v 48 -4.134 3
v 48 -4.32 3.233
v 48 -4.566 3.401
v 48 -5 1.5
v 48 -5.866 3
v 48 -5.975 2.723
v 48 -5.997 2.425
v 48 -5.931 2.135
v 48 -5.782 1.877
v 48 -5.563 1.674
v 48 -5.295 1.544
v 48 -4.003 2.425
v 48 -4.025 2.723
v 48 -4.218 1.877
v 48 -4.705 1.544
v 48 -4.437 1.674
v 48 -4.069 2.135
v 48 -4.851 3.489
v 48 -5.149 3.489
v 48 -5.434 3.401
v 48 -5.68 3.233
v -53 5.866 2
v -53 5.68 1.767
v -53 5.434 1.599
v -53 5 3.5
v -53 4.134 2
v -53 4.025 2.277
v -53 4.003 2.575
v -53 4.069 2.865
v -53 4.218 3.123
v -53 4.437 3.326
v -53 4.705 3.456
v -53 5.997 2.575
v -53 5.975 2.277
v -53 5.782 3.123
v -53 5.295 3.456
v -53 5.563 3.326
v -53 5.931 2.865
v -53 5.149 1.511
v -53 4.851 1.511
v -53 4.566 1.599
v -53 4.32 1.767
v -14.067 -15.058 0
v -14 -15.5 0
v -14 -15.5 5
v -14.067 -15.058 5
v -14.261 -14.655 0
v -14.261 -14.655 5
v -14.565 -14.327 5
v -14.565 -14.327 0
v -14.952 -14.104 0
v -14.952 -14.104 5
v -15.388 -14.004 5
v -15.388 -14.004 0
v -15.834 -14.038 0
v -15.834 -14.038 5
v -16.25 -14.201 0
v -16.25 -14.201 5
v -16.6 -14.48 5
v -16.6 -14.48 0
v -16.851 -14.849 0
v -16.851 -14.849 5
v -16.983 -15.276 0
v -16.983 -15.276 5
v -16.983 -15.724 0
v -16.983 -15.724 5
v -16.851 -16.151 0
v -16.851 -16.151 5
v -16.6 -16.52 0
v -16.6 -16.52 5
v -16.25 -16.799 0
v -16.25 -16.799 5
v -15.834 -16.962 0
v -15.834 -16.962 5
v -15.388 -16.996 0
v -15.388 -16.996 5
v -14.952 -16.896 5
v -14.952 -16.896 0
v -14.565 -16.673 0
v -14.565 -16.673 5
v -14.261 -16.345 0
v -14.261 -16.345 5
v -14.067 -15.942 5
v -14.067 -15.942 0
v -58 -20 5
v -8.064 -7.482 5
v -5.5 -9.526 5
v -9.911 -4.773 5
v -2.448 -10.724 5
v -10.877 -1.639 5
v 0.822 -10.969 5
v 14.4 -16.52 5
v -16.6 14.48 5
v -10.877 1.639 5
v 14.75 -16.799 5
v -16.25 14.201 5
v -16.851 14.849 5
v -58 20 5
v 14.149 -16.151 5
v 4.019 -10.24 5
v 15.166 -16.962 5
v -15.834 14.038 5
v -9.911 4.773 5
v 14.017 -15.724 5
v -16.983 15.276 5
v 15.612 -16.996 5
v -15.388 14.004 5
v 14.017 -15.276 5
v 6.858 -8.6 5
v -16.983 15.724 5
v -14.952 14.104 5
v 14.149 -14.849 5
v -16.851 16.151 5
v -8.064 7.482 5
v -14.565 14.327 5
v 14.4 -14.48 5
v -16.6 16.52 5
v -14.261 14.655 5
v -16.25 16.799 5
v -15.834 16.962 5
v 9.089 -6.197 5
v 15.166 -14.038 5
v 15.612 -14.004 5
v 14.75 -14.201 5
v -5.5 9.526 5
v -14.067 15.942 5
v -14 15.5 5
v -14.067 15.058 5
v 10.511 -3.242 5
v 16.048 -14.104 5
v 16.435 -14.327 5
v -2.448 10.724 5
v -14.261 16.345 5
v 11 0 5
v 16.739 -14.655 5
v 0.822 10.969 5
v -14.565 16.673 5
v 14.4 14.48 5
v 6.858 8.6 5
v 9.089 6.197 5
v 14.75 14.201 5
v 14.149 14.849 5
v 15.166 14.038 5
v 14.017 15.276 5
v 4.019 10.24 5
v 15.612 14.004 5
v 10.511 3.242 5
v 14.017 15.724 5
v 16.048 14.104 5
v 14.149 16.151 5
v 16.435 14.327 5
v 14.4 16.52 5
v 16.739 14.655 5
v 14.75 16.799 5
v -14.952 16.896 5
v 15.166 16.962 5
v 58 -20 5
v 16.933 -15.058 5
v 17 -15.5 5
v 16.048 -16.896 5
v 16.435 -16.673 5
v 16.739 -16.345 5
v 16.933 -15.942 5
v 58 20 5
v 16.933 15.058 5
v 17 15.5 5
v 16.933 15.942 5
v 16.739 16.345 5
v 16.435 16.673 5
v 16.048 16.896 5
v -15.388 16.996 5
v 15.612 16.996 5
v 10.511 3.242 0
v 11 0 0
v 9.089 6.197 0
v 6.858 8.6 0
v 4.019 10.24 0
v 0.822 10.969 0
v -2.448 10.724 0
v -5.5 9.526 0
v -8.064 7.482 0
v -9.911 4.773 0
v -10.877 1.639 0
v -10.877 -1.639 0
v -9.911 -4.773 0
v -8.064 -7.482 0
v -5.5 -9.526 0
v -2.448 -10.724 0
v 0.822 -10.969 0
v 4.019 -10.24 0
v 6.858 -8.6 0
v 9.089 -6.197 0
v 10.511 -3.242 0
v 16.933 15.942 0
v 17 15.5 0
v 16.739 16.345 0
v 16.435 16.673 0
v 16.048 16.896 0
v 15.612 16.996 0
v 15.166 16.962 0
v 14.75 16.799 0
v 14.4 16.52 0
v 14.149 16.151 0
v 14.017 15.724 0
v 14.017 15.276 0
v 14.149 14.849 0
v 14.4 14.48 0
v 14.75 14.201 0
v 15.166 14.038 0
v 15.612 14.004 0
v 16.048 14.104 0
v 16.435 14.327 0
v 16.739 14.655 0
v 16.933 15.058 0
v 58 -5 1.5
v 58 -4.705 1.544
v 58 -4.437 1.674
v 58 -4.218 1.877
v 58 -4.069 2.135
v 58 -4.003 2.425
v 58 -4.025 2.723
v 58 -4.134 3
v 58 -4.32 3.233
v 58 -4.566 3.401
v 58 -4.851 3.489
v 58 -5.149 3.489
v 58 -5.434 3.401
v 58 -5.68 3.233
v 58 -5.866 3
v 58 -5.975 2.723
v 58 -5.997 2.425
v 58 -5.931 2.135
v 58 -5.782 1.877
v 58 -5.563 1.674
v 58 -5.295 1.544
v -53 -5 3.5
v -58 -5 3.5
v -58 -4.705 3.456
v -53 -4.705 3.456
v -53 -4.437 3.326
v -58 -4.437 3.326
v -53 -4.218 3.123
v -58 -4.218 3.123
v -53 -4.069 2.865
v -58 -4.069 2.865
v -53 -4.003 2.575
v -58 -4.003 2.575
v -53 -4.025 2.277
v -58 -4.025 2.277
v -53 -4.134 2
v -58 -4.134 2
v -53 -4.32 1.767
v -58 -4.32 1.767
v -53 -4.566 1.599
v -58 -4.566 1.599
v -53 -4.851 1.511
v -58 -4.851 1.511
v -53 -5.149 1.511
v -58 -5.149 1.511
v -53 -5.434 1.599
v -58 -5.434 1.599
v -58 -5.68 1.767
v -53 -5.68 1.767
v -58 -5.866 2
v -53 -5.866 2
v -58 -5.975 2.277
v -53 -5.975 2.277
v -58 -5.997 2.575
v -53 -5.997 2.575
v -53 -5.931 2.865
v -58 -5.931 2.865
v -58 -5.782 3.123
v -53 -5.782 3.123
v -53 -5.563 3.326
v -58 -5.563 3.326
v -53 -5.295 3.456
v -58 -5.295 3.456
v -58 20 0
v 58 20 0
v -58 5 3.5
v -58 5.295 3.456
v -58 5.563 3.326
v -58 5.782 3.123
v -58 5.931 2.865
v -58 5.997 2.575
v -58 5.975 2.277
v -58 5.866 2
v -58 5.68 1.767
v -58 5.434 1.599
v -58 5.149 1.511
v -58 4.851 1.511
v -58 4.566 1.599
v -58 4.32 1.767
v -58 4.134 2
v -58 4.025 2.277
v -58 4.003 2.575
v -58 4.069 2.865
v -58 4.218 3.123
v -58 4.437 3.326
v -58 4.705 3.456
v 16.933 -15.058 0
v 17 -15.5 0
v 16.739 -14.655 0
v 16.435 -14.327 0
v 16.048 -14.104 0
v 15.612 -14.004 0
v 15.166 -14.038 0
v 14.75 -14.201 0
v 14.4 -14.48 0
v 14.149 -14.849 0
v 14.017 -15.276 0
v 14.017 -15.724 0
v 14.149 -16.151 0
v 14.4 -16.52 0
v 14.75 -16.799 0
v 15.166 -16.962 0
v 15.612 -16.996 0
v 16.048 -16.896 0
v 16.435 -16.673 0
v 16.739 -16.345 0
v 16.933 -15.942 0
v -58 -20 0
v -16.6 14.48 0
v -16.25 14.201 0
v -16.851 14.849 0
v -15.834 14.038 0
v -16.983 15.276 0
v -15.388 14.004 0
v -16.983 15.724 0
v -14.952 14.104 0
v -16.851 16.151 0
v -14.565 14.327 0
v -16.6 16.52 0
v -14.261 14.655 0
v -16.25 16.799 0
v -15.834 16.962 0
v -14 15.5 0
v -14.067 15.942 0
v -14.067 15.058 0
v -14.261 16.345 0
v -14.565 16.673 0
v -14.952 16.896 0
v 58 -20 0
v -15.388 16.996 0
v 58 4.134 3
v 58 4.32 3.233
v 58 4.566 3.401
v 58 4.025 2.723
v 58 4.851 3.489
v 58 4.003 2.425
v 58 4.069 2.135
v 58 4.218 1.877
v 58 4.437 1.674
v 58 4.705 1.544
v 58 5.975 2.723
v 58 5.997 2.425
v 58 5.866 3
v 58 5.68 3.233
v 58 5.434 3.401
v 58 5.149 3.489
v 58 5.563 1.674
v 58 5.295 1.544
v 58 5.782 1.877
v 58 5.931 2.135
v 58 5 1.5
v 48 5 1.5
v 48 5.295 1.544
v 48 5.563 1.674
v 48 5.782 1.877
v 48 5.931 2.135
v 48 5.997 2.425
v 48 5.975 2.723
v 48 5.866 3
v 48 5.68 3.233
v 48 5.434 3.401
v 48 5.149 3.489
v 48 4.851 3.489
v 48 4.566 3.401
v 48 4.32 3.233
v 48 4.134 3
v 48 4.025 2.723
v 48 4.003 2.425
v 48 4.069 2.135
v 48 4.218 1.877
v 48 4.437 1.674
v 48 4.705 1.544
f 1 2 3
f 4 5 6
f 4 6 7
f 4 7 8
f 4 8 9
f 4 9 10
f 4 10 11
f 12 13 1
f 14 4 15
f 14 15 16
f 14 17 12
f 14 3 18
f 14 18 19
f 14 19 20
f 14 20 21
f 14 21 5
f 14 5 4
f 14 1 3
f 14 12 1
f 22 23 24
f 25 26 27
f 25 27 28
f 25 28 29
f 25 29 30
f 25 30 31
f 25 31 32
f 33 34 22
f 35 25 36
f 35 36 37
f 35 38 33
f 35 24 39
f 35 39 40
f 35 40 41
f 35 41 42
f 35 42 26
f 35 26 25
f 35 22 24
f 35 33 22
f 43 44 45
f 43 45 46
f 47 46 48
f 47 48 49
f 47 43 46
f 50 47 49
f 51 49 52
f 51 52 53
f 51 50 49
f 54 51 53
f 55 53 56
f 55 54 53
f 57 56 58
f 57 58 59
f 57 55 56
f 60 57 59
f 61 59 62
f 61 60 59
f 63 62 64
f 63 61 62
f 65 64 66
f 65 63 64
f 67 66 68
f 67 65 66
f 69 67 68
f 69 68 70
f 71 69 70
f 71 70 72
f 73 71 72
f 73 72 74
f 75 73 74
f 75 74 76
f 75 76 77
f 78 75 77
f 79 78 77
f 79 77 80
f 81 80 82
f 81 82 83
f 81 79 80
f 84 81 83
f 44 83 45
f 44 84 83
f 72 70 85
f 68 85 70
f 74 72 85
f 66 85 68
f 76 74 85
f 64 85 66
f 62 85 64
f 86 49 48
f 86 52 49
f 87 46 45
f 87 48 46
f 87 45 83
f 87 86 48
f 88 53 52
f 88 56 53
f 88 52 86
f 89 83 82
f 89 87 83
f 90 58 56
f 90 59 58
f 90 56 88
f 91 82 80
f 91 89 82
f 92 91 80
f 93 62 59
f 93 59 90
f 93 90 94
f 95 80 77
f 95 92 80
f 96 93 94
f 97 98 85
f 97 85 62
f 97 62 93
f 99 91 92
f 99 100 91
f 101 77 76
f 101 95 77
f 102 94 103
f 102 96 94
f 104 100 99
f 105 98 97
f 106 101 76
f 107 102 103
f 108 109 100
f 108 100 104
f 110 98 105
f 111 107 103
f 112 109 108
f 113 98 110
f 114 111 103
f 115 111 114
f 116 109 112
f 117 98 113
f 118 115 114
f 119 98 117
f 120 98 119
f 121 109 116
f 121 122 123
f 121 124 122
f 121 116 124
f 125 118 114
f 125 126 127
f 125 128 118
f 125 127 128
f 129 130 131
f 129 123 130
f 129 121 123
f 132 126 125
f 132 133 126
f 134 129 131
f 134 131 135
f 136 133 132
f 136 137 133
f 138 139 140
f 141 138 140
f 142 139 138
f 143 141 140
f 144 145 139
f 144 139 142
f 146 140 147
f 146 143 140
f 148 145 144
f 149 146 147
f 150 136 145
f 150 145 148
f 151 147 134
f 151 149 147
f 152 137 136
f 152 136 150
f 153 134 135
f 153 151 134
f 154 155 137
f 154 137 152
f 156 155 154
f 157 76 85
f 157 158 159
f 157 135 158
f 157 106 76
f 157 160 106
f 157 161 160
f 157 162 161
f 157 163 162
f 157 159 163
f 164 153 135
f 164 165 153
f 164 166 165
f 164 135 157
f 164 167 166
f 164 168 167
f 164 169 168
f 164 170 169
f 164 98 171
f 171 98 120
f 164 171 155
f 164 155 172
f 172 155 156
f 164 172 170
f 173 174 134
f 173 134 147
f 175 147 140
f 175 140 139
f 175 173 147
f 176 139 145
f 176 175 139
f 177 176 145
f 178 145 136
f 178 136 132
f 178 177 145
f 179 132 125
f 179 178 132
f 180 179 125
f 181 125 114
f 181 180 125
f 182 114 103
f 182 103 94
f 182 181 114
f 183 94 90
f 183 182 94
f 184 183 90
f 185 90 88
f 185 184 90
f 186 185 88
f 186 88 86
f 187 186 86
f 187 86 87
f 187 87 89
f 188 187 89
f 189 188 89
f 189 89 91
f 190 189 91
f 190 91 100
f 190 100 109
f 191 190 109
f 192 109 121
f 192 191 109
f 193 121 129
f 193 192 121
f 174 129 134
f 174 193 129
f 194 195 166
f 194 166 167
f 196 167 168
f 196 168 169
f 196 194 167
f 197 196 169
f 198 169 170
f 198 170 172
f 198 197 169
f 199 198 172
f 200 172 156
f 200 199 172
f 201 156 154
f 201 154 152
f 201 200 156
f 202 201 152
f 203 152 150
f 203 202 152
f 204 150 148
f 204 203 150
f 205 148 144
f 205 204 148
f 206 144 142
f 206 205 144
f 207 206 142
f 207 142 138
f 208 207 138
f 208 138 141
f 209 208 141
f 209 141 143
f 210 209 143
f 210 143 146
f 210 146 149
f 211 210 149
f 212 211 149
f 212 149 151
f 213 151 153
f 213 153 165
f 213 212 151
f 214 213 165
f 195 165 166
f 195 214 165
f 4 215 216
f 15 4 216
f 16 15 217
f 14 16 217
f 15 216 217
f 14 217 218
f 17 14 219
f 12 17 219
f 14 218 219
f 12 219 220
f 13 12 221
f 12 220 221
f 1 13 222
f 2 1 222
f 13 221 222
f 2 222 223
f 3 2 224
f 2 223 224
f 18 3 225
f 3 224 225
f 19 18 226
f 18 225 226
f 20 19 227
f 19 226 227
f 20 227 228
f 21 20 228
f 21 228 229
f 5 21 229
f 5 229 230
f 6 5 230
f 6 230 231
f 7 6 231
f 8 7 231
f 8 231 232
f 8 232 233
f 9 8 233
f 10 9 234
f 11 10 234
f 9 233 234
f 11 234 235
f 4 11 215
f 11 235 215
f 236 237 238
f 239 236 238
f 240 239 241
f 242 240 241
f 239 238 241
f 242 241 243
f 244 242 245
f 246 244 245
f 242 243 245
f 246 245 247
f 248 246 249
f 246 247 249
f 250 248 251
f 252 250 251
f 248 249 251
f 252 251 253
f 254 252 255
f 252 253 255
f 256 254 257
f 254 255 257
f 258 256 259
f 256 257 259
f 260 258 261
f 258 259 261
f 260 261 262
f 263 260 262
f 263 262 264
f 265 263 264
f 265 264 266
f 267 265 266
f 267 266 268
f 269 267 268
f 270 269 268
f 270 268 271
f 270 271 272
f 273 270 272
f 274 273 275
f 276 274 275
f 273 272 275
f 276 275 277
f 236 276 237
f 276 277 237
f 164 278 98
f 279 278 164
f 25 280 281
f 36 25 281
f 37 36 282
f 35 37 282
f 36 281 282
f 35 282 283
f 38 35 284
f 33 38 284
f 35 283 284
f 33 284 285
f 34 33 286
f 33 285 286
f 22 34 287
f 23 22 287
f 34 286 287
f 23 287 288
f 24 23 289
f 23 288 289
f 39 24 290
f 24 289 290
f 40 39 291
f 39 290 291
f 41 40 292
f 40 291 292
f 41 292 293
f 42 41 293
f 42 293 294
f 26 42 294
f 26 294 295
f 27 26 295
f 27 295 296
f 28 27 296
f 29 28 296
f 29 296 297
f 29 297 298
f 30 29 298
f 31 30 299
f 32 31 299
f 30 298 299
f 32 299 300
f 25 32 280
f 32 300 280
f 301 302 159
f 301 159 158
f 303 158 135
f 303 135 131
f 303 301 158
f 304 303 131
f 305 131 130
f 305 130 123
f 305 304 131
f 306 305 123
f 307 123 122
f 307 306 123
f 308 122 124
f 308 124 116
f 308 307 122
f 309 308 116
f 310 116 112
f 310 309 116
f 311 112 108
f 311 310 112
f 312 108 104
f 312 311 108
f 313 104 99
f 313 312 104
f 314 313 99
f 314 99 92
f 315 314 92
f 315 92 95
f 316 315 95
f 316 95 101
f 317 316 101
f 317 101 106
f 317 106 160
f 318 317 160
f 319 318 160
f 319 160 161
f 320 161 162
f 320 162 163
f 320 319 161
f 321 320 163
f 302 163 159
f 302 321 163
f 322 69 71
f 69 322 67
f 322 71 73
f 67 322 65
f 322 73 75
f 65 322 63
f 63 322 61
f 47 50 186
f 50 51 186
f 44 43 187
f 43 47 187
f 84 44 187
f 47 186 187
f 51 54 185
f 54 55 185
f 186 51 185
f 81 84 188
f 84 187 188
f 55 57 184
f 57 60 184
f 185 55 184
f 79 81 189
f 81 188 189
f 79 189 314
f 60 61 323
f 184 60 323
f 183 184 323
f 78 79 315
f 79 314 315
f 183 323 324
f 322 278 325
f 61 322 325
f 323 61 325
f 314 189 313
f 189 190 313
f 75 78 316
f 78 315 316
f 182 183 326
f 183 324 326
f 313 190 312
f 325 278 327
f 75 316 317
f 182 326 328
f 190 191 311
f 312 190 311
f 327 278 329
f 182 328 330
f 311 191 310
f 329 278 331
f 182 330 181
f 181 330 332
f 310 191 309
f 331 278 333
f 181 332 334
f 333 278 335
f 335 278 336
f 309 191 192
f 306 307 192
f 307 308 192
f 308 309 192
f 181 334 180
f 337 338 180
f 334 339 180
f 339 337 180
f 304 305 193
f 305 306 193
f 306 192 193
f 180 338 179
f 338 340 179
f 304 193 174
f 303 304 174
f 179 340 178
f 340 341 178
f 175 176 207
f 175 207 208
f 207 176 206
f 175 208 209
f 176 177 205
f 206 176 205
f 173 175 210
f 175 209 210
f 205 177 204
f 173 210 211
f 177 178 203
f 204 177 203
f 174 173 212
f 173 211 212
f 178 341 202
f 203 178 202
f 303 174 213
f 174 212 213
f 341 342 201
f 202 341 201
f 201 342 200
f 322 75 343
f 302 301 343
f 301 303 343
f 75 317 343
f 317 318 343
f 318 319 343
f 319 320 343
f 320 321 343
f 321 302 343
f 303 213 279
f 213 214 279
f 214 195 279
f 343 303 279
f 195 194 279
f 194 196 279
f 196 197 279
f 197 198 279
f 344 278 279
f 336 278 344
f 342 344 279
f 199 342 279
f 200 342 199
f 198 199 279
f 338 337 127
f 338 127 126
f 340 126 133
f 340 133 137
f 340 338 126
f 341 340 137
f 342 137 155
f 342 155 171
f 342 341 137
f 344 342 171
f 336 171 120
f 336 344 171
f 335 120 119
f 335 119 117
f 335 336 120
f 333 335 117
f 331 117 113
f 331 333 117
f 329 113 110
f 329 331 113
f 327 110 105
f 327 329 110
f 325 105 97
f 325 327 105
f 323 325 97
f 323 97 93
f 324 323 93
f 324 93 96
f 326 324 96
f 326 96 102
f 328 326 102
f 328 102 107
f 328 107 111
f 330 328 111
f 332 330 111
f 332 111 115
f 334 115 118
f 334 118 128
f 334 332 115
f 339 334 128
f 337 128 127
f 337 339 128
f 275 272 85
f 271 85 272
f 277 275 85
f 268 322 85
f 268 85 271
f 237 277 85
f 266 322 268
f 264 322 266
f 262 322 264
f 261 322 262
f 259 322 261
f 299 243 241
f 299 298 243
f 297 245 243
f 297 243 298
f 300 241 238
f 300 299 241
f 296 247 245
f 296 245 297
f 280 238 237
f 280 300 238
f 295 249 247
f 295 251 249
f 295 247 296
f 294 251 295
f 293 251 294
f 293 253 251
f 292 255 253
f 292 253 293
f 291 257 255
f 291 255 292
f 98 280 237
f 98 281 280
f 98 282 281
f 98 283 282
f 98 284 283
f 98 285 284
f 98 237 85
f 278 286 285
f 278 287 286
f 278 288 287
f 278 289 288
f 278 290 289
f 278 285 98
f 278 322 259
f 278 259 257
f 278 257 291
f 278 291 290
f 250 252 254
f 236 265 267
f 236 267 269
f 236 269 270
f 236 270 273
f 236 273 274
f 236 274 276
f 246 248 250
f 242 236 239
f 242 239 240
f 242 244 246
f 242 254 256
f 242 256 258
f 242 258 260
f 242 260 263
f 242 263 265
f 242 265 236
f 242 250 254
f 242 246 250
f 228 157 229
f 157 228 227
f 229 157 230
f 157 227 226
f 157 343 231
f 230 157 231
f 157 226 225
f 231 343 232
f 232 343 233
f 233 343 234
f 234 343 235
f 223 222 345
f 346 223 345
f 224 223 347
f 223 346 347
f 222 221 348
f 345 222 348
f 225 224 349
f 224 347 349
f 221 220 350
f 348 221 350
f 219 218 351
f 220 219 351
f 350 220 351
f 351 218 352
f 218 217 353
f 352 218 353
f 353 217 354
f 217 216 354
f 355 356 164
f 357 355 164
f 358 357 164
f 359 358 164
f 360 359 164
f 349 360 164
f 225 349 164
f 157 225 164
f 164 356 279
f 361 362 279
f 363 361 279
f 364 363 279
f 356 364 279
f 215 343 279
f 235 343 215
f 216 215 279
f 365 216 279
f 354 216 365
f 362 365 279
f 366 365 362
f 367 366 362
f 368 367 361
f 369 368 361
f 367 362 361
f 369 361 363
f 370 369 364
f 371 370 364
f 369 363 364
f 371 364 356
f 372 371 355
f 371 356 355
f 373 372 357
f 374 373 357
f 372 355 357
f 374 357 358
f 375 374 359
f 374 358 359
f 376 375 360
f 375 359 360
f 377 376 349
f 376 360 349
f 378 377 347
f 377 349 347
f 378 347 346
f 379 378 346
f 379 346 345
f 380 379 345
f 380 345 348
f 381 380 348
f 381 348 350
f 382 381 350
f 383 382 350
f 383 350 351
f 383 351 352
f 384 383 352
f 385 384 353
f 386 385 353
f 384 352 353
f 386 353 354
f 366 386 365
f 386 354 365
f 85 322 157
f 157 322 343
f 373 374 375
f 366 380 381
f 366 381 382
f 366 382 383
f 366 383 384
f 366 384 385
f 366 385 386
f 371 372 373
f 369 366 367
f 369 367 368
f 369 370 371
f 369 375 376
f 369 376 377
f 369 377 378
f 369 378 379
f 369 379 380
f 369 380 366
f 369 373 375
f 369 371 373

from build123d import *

# Parameters (mm, degrees)
SKETCH1_W           = 116
SKETCH1_H           = 40
SKETCH1_R           = 11
SKETCH1_R_2         = 1.5
BOSS_EXTRUDE2_DEPTH = 5
SKETCH4_R           = 1
CUT_EXTRUDE1_DEPTH  = 10
SKETCH6_R           = 1
CUT_EXTRUDE2_DEPTH  = 5


with BuildPart() as part:
    # Sketch1 → Boss-Extrude2 (new body)
    with BuildSketch(Plane.XY):
        Rectangle(SKETCH1_W, SKETCH1_H)
        Circle(SKETCH1_R, mode=Mode.SUBTRACT)
        with Locations((-15.5, 15.5)):
            Circle(SKETCH1_R_2, mode=Mode.SUBTRACT)
        with Locations((-15.5, -15.5)):
            Circle(SKETCH1_R_2, mode=Mode.SUBTRACT)
        with Locations((15.5, -15.5)):
            Circle(SKETCH1_R_2, mode=Mode.SUBTRACT)
        with Locations((15.5, 15.5)):
            Circle(SKETCH1_R_2, mode=Mode.SUBTRACT)
    extrude(amount=BOSS_EXTRUDE2_DEPTH)

    # Sketch4 → Cut-Extrude1 (cut)
    with BuildSketch(Plane(origin=(58, 0, 0), x_dir=(0, 0, -1), z_dir=(1, 0, 0))):
        with Locations((-2.5, -5)):
            Circle(SKETCH4_R)
        with Locations((-2.5, 5)):
            Circle(SKETCH4_R)
    extrude(amount=-CUT_EXTRUDE1_DEPTH, mode=Mode.SUBTRACT)

    # Sketch6 → Cut-Extrude2 (cut)
    with BuildSketch(Plane.ZY.offset(58)):
        with Locations((2.5, 5)):
            Circle(SKETCH6_R)
        with Locations((2.5, -5)):
            Circle(SKETCH6_R)
    extrude(amount=-CUT_EXTRUDE2_DEPTH, mode=Mode.SUBTRACT)


solid = part.part
